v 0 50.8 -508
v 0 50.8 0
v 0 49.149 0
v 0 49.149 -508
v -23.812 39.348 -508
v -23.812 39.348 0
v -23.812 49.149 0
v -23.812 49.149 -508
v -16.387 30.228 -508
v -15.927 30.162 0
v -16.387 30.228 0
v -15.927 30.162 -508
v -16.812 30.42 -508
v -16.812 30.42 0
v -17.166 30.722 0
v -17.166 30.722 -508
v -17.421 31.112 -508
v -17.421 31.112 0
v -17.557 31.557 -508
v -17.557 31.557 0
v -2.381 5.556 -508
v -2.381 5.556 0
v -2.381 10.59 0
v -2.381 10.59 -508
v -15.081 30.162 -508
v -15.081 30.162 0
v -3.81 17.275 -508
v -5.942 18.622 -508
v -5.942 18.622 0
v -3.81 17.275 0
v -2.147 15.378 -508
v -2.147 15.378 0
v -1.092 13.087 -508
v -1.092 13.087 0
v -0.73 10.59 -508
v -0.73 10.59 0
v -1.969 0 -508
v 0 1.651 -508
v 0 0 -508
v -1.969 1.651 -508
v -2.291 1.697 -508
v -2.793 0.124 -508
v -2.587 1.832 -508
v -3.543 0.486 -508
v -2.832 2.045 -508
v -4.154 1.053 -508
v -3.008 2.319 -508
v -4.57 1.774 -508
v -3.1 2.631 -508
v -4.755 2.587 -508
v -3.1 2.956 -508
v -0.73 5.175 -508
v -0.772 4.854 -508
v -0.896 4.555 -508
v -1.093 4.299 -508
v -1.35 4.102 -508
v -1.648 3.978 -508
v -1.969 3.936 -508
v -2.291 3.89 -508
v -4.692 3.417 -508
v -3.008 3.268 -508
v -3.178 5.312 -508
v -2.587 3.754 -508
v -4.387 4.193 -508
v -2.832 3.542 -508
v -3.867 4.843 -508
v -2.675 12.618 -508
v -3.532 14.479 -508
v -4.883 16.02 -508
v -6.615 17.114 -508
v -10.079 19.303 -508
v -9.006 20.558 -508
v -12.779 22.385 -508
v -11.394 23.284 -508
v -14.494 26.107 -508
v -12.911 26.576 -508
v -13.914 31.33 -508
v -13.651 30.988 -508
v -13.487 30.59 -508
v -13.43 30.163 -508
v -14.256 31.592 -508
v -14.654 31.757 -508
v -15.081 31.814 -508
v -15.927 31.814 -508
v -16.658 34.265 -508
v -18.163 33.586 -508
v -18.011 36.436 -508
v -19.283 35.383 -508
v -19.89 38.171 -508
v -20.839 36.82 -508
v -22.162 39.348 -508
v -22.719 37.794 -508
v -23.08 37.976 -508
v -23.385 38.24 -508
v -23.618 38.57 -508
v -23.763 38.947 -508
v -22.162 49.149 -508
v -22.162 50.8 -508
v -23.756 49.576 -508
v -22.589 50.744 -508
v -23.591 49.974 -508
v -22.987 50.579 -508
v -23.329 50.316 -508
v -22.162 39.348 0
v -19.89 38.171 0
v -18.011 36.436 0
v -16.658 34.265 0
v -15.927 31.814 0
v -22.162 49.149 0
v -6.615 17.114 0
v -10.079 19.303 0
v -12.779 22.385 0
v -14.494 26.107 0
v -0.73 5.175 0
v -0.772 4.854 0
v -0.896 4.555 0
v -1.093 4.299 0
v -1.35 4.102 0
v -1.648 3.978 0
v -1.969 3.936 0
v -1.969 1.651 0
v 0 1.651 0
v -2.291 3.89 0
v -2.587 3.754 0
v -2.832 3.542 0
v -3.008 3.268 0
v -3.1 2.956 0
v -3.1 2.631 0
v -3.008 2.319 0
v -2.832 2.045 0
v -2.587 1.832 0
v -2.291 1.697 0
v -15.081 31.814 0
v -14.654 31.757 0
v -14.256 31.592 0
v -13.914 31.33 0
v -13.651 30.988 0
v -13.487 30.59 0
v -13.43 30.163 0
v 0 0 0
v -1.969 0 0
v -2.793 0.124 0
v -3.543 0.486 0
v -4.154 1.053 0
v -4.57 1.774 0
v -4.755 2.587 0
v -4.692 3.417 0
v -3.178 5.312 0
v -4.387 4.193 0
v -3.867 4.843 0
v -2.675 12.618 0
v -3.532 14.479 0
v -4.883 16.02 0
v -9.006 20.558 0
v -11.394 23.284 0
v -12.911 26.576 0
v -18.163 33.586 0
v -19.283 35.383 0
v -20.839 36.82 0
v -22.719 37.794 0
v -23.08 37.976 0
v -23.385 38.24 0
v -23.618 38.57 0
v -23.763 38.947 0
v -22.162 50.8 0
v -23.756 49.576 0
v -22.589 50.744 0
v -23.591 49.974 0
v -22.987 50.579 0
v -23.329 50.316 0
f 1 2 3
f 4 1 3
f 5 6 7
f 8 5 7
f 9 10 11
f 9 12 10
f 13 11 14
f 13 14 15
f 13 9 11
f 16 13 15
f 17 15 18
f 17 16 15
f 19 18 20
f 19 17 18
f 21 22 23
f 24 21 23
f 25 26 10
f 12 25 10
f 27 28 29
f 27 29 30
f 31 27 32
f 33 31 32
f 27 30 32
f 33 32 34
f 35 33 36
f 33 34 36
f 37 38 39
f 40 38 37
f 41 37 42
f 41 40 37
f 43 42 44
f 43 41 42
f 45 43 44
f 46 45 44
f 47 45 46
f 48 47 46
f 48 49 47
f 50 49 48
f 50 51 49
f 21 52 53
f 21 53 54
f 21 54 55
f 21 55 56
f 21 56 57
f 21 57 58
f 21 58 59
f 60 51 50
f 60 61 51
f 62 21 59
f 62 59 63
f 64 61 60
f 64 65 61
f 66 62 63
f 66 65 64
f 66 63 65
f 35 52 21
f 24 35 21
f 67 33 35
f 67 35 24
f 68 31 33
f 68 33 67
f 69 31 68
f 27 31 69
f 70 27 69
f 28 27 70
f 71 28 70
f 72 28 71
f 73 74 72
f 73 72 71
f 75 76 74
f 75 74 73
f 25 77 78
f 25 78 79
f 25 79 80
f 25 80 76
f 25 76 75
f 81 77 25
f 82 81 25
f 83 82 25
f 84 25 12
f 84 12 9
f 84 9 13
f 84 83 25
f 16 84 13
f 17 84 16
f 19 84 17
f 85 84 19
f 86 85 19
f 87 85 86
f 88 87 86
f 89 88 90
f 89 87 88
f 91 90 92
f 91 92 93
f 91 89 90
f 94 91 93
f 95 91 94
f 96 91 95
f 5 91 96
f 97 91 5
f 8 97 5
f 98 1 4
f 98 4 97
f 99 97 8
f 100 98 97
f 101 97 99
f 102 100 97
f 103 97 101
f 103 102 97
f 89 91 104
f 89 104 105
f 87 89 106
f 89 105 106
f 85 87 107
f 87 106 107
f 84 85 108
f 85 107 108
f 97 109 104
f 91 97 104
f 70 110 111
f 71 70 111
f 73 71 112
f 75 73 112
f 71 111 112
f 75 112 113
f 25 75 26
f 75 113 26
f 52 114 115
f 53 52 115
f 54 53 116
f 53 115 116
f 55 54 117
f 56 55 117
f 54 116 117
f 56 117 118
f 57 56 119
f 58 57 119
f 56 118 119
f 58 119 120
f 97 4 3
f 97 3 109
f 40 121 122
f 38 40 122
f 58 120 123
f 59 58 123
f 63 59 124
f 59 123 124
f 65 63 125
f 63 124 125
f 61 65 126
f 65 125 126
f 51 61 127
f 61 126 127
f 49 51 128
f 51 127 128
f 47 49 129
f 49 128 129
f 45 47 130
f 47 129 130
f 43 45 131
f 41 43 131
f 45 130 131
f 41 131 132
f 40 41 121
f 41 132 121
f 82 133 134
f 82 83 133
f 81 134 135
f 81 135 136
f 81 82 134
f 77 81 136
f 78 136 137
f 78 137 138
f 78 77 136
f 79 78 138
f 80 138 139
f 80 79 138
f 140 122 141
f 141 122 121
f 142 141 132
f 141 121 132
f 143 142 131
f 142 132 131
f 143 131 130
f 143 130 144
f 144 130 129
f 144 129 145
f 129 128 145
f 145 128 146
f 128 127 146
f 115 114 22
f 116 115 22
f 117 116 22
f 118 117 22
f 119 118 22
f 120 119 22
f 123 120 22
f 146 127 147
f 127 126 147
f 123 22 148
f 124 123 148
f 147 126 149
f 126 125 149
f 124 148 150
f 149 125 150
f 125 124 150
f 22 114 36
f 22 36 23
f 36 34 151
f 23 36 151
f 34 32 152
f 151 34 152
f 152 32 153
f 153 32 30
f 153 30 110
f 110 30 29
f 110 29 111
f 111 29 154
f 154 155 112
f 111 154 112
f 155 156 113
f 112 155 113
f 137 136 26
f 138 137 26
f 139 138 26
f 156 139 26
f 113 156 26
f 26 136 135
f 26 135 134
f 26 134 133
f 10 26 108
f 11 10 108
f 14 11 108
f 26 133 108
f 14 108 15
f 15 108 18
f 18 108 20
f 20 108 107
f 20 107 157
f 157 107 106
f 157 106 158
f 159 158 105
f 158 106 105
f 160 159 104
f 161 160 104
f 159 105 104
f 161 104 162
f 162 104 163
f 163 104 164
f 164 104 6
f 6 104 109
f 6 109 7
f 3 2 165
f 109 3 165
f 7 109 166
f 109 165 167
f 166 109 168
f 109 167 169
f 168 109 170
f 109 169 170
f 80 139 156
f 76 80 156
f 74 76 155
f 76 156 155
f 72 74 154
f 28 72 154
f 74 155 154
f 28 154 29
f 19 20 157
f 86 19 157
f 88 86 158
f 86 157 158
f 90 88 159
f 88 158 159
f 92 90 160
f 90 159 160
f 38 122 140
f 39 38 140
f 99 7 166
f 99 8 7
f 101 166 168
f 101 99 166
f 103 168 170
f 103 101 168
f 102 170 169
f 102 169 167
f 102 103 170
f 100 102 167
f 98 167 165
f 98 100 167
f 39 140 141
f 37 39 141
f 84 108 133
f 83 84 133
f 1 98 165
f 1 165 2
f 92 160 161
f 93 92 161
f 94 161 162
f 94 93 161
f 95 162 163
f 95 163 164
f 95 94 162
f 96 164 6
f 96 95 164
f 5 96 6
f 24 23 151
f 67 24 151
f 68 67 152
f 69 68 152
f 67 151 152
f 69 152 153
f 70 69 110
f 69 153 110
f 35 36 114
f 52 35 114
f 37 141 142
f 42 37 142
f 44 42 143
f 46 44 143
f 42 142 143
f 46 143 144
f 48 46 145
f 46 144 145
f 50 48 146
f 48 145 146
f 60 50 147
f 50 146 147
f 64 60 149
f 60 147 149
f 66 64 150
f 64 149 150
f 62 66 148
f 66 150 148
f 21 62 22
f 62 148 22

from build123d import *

# Parameters (mm, degrees)
BOSS_EXTRUDE1_DEPTH = 508
FILLET1_R           = 1.651


with BuildPart() as part:
    # Sketch1 → Boss-Extrude1 (new body)
    with BuildSketch(Plane.XY):
        with BuildLine():
            Line((0, 0), (-1.969087929, 0))
            ThreePointArc((-1.969087929, 0), (-4.754845979, 2.586764816), (-2.38125, 5.55625))
            Line((-2.38125, 5.55625), (-2.38125, 10.590485541))
            ThreePointArc((-2.38125, 10.590485541), (-3.532318917, 14.479050507), (-6.614583333, 17.11449036))
            ThreePointArc((-6.614583333, 17.11449036), (-12.779112166, 22.385370067), (-15.08125, 30.1625))
            Line((-15.08125, 30.1625), (-17.4625, 30.1625))
            ThreePointArc((-17.4625, 30.1625), (-19.200240239, 35.281057809), (-23.8125, 38.1))
            Line((-23.8125, 38.1), (-23.8125, 50.8))
            Line((-23.8125, 50.8), (0, 50.8))
            Line((0, 50.8), (0, 49.149))
            Line((0, 49.149), (-22.1615, 49.149))
            Line((-22.1615, 49.149), (-22.1615, 39.348165423))
            ThreePointArc((-22.1615, 39.348165423), (-18.011172085, 36.435510418), (-15.926513678, 31.8135))
            Line((-15.926513678, 31.8135), (-13.321931482, 31.8135))
            ThreePointArc((-13.321931482, 31.8135), (-11.821707612, 23.992793107), (-5.941953704, 18.622260363))
            ThreePointArc((-5.941953704, 18.622260363), (-2.147343733, 15.377741077), (-0.73025, 10.590485541))
            Line((-0.73025, 10.590485541), (-0.73025, 5.174662071))
            ThreePointArc((-0.73025, 5.174662071), (-1.093097229, 4.29867137), (-1.969087929, 3.935824141))
            ThreePointArc((-1.969087929, 3.935824141), (-3.1115, 2.793412071), (-1.969087929, 1.651))
            Line((-1.969087929, 1.651), (0, 1.651))
            Line((0, 1.651), (0, 0))
        make_face()
    extrude(amount=-BOSS_EXTRUDE1_DEPTH)

    # Fillet1
    fillet1_edges = [part.edges().sort_by_distance(p)[0] for p in [
        (-17.4625, 30.1625, -254),
        (-23.8125, 38.1, -254),
        (-23.8125, 50.8, -254),
        (-13.321931482, 31.8135, -254),
    ]]
    fillet(fillet1_edges, radius=FILLET1_R)


solid = part.part
